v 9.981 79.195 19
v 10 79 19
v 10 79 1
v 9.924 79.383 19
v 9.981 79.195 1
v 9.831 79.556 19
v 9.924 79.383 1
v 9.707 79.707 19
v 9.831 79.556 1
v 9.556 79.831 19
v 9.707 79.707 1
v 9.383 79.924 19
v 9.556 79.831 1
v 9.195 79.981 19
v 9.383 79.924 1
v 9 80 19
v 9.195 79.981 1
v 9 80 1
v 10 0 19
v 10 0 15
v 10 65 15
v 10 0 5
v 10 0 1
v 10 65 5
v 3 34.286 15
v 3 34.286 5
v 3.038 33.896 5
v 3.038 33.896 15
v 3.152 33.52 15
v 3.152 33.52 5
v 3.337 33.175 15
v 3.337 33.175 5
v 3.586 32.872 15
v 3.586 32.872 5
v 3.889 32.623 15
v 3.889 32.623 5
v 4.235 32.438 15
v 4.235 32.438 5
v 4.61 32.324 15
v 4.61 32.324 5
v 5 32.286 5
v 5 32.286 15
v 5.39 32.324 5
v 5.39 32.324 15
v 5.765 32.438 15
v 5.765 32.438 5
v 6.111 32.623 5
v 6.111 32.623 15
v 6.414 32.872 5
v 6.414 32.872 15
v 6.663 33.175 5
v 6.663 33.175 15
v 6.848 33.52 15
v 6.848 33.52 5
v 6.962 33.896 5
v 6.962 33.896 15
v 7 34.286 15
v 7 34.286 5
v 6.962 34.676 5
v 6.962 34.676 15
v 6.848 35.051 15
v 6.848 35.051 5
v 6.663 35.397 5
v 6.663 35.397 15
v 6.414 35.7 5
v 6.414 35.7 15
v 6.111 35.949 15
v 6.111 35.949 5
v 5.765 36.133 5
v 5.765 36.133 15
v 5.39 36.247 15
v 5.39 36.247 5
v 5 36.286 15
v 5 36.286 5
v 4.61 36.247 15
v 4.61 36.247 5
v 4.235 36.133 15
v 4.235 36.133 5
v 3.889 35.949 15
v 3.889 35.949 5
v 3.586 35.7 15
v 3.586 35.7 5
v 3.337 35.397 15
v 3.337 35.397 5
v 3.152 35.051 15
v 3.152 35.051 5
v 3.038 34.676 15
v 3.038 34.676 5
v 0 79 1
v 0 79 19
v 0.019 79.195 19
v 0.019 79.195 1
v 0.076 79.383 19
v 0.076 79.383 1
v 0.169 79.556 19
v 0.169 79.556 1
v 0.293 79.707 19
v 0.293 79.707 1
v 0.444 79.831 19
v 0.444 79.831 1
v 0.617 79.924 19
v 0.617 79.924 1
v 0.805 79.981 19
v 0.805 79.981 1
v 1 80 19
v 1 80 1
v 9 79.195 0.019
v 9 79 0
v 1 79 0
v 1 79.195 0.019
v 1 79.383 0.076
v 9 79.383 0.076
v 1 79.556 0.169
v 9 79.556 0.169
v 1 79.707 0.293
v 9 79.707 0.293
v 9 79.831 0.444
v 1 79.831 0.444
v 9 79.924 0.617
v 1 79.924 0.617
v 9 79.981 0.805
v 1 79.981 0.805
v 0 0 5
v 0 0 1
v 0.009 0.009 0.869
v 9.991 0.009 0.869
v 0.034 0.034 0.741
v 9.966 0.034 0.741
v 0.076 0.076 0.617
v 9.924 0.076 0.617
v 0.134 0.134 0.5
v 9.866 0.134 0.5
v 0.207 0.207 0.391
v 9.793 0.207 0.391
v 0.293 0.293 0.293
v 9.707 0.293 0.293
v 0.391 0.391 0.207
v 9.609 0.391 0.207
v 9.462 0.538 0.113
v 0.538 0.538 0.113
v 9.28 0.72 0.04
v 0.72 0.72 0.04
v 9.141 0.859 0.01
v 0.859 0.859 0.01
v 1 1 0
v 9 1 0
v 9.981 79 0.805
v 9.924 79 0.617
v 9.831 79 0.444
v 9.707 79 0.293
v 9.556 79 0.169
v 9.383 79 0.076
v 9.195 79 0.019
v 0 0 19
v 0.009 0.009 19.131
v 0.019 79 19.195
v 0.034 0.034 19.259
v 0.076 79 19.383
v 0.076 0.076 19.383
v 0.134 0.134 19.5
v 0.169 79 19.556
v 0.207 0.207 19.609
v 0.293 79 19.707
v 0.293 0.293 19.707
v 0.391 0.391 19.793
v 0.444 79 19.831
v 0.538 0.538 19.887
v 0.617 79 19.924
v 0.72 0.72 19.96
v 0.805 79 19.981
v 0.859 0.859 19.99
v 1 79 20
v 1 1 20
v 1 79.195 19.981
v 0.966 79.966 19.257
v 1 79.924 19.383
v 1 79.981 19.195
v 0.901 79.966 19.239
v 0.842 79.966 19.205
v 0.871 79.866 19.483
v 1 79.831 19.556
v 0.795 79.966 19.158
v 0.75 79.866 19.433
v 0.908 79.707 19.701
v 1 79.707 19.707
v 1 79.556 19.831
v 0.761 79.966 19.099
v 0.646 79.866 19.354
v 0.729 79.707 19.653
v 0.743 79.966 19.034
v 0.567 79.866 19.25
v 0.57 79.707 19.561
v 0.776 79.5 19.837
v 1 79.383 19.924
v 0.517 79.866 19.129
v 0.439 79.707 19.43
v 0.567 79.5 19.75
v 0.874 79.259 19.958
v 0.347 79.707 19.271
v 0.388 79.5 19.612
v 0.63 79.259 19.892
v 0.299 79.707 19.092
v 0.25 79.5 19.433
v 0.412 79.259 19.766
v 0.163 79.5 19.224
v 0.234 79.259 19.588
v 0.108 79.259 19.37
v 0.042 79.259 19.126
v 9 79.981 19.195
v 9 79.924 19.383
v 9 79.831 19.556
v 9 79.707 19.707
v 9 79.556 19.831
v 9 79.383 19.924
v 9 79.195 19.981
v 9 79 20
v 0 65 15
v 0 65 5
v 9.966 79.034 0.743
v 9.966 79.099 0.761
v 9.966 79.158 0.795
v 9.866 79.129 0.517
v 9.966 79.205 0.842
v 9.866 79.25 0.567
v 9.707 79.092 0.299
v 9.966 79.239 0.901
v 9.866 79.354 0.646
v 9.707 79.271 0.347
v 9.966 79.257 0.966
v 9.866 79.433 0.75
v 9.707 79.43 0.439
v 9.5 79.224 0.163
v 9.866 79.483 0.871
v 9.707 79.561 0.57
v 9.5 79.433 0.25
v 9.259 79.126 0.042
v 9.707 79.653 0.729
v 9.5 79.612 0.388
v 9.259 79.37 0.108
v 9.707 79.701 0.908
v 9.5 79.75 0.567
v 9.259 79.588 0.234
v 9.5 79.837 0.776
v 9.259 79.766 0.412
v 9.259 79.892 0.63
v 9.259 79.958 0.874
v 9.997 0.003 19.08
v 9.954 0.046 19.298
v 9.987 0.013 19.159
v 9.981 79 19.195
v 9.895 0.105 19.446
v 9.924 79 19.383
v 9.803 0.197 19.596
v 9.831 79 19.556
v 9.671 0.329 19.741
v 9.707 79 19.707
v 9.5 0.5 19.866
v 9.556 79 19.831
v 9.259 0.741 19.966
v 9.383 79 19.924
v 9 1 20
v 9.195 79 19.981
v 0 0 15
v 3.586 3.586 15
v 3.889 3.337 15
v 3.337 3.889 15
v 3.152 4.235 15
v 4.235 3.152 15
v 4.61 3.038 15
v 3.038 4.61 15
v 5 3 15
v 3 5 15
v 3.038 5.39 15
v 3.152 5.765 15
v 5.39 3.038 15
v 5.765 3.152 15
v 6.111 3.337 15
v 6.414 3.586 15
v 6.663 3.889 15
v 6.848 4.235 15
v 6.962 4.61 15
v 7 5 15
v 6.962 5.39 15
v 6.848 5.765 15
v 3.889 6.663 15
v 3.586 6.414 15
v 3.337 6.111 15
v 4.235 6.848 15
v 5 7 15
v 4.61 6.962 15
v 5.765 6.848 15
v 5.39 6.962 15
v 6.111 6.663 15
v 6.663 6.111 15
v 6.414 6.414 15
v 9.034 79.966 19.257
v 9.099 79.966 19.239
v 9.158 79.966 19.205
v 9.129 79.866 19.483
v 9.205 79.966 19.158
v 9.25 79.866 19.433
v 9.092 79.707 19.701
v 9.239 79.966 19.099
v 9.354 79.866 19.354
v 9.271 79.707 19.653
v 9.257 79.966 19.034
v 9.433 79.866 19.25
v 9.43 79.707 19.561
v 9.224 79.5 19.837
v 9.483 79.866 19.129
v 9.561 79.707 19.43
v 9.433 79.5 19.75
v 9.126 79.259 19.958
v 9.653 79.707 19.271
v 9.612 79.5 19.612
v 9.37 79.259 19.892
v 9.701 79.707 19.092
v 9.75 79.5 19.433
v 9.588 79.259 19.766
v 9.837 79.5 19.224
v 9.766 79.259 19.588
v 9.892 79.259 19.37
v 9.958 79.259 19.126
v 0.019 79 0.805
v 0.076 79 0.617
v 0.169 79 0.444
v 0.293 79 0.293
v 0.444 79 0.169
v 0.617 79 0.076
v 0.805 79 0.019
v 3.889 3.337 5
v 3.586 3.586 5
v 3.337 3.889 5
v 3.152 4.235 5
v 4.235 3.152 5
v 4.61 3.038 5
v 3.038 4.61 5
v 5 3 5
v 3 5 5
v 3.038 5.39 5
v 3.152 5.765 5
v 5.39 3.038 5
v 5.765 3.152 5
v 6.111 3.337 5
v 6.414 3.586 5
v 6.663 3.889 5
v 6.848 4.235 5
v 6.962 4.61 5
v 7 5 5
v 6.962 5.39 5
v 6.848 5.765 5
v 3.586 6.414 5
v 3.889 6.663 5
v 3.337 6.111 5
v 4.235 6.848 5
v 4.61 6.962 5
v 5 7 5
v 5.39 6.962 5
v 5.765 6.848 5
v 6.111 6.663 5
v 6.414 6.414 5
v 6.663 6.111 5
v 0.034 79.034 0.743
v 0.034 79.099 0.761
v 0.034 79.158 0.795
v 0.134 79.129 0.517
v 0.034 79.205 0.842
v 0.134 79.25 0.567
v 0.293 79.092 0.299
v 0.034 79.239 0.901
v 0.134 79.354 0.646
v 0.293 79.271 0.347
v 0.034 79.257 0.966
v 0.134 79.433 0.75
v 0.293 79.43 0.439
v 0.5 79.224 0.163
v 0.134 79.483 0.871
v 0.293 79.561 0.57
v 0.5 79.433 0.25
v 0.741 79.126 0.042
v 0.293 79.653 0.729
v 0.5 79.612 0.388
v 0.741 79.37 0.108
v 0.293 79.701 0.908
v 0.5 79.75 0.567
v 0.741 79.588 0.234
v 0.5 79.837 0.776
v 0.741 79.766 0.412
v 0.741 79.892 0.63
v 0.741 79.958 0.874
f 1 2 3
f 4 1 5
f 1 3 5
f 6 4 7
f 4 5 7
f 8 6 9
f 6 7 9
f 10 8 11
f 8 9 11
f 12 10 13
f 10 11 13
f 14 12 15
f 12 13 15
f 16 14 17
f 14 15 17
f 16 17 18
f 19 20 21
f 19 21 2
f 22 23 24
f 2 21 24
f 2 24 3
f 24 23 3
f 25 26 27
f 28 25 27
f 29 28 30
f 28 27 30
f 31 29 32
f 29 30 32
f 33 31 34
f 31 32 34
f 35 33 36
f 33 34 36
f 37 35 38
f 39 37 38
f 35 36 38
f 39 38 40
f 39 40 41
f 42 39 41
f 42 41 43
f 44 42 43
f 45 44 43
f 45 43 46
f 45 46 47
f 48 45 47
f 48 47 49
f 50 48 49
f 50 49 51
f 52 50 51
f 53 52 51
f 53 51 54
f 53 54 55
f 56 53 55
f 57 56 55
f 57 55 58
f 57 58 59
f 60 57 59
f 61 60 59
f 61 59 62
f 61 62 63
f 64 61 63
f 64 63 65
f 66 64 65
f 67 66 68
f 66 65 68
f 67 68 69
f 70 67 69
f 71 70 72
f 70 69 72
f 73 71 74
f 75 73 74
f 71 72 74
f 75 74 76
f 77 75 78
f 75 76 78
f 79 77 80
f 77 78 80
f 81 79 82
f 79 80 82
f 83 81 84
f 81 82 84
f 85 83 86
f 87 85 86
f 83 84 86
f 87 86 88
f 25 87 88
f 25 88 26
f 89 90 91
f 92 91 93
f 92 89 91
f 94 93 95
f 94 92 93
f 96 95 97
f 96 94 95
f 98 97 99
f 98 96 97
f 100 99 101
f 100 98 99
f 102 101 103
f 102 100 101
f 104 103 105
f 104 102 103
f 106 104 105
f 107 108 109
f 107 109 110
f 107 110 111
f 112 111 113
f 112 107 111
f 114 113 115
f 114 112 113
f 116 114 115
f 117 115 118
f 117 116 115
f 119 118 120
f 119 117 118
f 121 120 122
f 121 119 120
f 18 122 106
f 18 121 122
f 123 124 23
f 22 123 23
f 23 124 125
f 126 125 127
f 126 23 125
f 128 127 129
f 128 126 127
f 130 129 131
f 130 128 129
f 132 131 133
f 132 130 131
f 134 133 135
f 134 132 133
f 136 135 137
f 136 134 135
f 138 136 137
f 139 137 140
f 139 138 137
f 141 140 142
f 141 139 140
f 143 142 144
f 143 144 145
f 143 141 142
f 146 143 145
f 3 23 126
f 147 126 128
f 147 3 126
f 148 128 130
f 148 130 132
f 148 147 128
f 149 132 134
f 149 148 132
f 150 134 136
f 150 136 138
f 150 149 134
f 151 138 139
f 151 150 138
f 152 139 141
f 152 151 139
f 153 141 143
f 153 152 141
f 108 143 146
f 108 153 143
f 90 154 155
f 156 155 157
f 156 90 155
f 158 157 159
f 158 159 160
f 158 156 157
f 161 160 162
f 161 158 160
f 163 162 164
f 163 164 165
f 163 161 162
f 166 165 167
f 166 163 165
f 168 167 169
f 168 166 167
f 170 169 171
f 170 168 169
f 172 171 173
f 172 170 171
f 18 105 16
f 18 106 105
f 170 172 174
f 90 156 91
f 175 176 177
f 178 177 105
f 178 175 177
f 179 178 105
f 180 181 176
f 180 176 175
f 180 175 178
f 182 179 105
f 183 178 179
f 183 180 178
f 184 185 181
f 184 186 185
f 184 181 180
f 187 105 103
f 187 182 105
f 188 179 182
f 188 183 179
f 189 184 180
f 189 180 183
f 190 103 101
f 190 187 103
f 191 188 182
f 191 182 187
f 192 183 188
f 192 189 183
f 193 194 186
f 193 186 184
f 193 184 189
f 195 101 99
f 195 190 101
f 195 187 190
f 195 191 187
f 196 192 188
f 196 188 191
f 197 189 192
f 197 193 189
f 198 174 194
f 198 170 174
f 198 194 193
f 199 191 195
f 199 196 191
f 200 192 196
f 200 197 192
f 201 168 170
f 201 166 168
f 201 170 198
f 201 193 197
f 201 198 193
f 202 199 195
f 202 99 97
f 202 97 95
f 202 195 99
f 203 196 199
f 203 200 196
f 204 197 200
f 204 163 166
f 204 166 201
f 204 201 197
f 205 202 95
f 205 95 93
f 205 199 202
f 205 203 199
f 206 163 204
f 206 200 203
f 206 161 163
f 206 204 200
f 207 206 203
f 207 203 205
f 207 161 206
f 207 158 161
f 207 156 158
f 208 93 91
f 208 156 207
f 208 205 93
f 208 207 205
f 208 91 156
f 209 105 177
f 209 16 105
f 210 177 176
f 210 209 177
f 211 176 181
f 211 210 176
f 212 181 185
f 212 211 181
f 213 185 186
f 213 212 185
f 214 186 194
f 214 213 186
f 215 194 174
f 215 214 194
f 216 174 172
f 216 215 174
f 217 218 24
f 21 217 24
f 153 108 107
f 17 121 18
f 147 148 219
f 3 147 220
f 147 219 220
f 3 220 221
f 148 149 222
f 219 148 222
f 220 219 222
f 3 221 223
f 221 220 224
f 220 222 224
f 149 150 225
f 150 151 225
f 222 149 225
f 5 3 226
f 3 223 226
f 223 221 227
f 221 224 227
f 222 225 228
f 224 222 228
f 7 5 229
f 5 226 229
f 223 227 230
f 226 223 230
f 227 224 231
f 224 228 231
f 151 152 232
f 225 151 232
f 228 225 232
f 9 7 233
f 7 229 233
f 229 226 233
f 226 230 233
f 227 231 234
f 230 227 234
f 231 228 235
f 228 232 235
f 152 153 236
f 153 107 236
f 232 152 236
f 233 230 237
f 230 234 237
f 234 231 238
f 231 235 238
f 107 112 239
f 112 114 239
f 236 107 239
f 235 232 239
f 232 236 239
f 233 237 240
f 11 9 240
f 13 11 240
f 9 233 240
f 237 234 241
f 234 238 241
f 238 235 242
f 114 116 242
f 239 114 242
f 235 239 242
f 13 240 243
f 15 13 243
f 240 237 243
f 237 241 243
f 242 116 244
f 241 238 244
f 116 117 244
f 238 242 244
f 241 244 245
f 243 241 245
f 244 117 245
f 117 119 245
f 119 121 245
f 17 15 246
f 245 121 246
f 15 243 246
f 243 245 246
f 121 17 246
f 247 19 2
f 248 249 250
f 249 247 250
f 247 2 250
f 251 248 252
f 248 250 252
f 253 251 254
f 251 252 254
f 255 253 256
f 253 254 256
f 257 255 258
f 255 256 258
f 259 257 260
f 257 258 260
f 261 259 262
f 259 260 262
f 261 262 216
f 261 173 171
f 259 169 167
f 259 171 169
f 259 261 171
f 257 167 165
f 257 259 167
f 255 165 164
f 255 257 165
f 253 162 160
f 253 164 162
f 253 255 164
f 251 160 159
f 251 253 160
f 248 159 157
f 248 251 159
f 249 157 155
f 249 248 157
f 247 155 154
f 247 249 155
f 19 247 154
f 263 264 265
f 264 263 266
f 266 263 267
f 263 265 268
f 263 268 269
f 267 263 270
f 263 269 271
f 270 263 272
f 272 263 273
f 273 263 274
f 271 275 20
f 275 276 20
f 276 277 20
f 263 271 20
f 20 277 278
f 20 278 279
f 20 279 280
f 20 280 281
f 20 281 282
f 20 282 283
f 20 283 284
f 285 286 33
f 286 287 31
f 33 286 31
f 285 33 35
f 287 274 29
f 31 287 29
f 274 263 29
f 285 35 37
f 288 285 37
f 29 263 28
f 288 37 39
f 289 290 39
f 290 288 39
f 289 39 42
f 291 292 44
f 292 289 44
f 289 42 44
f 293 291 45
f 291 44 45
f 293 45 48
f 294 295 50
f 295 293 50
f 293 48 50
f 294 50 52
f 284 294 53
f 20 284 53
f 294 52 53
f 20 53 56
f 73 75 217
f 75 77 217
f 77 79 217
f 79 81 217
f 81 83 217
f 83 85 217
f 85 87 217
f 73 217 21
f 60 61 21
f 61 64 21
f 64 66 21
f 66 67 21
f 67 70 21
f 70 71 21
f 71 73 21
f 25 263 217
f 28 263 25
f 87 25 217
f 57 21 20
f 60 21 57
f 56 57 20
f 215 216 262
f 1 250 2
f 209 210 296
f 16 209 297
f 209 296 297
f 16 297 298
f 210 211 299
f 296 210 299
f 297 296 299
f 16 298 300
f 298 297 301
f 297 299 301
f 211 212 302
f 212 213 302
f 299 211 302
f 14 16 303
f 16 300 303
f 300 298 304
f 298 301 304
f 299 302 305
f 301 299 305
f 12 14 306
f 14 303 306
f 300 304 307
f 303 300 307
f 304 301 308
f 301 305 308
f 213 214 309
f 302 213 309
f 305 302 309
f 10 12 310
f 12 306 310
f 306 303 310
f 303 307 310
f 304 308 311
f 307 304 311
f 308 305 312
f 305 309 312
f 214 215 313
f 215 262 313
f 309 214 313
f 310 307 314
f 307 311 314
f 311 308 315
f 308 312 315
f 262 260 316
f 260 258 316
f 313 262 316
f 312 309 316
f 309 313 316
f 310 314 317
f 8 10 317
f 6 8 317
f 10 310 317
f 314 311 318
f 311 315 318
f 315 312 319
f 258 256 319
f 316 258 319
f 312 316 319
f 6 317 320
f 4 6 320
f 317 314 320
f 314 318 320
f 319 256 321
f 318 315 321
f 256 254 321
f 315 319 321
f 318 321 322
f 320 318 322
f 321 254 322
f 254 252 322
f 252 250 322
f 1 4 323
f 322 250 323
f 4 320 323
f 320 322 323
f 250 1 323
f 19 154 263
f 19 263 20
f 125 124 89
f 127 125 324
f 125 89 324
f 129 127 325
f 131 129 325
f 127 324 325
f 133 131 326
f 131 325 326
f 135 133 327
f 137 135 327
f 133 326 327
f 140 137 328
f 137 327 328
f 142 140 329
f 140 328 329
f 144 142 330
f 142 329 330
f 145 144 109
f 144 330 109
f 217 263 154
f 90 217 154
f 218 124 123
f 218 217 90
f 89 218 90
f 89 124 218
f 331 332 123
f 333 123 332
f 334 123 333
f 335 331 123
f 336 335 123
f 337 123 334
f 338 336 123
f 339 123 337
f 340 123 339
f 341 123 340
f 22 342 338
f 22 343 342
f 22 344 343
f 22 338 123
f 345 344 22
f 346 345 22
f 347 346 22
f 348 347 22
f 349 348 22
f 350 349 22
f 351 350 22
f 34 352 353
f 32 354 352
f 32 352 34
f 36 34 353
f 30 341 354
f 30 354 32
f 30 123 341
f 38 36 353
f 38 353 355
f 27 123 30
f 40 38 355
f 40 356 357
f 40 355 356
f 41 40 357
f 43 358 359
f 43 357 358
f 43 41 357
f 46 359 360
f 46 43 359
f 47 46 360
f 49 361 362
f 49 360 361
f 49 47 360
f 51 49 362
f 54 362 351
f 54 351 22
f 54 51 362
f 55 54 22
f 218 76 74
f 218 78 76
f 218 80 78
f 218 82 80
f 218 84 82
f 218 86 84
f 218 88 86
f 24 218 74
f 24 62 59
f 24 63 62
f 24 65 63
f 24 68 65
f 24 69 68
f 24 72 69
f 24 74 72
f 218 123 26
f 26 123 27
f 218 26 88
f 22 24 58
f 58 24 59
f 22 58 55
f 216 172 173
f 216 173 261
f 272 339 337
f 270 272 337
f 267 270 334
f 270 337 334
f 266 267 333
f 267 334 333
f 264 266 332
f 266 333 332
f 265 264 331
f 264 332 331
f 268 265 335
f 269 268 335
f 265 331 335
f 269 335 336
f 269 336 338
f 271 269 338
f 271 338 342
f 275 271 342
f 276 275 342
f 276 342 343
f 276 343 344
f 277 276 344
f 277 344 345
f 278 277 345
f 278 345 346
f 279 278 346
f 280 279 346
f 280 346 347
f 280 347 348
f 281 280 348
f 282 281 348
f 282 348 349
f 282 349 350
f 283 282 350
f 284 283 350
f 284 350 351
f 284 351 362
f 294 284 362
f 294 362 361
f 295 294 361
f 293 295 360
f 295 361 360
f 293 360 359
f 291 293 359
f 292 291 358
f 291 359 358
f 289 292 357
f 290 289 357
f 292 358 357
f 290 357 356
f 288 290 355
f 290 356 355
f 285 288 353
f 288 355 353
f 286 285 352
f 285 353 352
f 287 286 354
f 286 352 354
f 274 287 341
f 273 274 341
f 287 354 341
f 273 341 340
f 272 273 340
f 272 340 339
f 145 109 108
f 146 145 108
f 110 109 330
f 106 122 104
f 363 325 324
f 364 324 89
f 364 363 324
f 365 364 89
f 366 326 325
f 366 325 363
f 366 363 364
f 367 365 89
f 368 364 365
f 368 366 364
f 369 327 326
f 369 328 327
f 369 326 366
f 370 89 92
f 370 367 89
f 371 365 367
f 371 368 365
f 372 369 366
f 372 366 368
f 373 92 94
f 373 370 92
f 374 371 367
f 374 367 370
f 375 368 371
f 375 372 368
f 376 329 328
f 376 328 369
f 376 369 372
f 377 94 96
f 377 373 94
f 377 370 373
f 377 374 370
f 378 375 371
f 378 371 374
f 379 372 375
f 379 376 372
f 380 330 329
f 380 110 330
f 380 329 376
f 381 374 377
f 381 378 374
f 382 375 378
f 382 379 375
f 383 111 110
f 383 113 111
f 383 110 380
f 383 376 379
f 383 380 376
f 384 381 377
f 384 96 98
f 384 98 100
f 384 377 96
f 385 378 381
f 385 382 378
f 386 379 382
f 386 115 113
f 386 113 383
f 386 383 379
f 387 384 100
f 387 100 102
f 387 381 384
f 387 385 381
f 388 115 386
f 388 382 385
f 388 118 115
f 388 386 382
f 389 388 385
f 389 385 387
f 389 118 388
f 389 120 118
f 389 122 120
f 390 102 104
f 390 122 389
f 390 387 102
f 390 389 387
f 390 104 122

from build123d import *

# Parameters (mm, degrees)
SKETCH1_W           = 10
SKETCH1_H           = 80
BOSS_EXTRUDE1_DEPTH = 5
SKETCH2_R           = 2
BOSS_EXTRUDE2_DEPTH = 5
SKETCH3_W           = 10
SKETCH3_H           = 15
BOSS_EXTRUDE4_DEPTH = 10
FILLET1_R           = 1


with BuildPart() as part:
    # Sketch1 → Boss-Extrude1 (new body)
    with BuildSketch(Plane.XY):
        with Locations((5, 40)):
            Rectangle(SKETCH1_W, SKETCH1_H)
    boss_extrude1 = extrude(amount=BOSS_EXTRUDE1_DEPTH)

    # Sketch2 → Boss-Extrude2 (add)
    with BuildSketch(Plane.XY.offset(5)):
        with Locations(Location((5, 5, 0), (0, 0, 180))):
            Circle(SKETCH2_R)
        with Locations(Location((5, 34.285714286, 0), (0, 0, 180))):
            Circle(SKETCH2_R)
    boss_extrude2 = extrude(amount=BOSS_EXTRUDE2_DEPTH)

    # Mirror2: Boss-Extrude1, Boss-Extrude2 across plane
    add(boss_extrude1.mirror(Plane(origin=(5, 34.285714286, 10), x_dir=(1, 0, 0), z_dir=(0, 0, 1))))
    add(boss_extrude2.mirror(Plane(origin=(5, 34.285714286, 10), x_dir=(1, 0, 0), z_dir=(0, 0, 1))))

    # Sketch3 → Boss-Extrude4 (add)
    with BuildSketch(Plane.XY.offset(5)):
        with Locations((5, 72.5)):
            Rectangle(SKETCH3_W, SKETCH3_H)
    extrude(amount=BOSS_EXTRUDE4_DEPTH)

    # Fillet1
    fillet1_edges = [part.edges().sort_by_distance(p)[0] for p in [
        (0, 40, 20),
        (5, 0, 20),
        (10, 40, 20),
        (5, 80, 20),
        (5, 80, 0),
        (10, 40, 0),
        (5, 0, 0),
        (0, 40, 0),
        (0, 80, 10),
        (10, 80, 10),
    ]]
    fillet(fillet1_edges, radius=FILLET1_R)


solid = part.part
